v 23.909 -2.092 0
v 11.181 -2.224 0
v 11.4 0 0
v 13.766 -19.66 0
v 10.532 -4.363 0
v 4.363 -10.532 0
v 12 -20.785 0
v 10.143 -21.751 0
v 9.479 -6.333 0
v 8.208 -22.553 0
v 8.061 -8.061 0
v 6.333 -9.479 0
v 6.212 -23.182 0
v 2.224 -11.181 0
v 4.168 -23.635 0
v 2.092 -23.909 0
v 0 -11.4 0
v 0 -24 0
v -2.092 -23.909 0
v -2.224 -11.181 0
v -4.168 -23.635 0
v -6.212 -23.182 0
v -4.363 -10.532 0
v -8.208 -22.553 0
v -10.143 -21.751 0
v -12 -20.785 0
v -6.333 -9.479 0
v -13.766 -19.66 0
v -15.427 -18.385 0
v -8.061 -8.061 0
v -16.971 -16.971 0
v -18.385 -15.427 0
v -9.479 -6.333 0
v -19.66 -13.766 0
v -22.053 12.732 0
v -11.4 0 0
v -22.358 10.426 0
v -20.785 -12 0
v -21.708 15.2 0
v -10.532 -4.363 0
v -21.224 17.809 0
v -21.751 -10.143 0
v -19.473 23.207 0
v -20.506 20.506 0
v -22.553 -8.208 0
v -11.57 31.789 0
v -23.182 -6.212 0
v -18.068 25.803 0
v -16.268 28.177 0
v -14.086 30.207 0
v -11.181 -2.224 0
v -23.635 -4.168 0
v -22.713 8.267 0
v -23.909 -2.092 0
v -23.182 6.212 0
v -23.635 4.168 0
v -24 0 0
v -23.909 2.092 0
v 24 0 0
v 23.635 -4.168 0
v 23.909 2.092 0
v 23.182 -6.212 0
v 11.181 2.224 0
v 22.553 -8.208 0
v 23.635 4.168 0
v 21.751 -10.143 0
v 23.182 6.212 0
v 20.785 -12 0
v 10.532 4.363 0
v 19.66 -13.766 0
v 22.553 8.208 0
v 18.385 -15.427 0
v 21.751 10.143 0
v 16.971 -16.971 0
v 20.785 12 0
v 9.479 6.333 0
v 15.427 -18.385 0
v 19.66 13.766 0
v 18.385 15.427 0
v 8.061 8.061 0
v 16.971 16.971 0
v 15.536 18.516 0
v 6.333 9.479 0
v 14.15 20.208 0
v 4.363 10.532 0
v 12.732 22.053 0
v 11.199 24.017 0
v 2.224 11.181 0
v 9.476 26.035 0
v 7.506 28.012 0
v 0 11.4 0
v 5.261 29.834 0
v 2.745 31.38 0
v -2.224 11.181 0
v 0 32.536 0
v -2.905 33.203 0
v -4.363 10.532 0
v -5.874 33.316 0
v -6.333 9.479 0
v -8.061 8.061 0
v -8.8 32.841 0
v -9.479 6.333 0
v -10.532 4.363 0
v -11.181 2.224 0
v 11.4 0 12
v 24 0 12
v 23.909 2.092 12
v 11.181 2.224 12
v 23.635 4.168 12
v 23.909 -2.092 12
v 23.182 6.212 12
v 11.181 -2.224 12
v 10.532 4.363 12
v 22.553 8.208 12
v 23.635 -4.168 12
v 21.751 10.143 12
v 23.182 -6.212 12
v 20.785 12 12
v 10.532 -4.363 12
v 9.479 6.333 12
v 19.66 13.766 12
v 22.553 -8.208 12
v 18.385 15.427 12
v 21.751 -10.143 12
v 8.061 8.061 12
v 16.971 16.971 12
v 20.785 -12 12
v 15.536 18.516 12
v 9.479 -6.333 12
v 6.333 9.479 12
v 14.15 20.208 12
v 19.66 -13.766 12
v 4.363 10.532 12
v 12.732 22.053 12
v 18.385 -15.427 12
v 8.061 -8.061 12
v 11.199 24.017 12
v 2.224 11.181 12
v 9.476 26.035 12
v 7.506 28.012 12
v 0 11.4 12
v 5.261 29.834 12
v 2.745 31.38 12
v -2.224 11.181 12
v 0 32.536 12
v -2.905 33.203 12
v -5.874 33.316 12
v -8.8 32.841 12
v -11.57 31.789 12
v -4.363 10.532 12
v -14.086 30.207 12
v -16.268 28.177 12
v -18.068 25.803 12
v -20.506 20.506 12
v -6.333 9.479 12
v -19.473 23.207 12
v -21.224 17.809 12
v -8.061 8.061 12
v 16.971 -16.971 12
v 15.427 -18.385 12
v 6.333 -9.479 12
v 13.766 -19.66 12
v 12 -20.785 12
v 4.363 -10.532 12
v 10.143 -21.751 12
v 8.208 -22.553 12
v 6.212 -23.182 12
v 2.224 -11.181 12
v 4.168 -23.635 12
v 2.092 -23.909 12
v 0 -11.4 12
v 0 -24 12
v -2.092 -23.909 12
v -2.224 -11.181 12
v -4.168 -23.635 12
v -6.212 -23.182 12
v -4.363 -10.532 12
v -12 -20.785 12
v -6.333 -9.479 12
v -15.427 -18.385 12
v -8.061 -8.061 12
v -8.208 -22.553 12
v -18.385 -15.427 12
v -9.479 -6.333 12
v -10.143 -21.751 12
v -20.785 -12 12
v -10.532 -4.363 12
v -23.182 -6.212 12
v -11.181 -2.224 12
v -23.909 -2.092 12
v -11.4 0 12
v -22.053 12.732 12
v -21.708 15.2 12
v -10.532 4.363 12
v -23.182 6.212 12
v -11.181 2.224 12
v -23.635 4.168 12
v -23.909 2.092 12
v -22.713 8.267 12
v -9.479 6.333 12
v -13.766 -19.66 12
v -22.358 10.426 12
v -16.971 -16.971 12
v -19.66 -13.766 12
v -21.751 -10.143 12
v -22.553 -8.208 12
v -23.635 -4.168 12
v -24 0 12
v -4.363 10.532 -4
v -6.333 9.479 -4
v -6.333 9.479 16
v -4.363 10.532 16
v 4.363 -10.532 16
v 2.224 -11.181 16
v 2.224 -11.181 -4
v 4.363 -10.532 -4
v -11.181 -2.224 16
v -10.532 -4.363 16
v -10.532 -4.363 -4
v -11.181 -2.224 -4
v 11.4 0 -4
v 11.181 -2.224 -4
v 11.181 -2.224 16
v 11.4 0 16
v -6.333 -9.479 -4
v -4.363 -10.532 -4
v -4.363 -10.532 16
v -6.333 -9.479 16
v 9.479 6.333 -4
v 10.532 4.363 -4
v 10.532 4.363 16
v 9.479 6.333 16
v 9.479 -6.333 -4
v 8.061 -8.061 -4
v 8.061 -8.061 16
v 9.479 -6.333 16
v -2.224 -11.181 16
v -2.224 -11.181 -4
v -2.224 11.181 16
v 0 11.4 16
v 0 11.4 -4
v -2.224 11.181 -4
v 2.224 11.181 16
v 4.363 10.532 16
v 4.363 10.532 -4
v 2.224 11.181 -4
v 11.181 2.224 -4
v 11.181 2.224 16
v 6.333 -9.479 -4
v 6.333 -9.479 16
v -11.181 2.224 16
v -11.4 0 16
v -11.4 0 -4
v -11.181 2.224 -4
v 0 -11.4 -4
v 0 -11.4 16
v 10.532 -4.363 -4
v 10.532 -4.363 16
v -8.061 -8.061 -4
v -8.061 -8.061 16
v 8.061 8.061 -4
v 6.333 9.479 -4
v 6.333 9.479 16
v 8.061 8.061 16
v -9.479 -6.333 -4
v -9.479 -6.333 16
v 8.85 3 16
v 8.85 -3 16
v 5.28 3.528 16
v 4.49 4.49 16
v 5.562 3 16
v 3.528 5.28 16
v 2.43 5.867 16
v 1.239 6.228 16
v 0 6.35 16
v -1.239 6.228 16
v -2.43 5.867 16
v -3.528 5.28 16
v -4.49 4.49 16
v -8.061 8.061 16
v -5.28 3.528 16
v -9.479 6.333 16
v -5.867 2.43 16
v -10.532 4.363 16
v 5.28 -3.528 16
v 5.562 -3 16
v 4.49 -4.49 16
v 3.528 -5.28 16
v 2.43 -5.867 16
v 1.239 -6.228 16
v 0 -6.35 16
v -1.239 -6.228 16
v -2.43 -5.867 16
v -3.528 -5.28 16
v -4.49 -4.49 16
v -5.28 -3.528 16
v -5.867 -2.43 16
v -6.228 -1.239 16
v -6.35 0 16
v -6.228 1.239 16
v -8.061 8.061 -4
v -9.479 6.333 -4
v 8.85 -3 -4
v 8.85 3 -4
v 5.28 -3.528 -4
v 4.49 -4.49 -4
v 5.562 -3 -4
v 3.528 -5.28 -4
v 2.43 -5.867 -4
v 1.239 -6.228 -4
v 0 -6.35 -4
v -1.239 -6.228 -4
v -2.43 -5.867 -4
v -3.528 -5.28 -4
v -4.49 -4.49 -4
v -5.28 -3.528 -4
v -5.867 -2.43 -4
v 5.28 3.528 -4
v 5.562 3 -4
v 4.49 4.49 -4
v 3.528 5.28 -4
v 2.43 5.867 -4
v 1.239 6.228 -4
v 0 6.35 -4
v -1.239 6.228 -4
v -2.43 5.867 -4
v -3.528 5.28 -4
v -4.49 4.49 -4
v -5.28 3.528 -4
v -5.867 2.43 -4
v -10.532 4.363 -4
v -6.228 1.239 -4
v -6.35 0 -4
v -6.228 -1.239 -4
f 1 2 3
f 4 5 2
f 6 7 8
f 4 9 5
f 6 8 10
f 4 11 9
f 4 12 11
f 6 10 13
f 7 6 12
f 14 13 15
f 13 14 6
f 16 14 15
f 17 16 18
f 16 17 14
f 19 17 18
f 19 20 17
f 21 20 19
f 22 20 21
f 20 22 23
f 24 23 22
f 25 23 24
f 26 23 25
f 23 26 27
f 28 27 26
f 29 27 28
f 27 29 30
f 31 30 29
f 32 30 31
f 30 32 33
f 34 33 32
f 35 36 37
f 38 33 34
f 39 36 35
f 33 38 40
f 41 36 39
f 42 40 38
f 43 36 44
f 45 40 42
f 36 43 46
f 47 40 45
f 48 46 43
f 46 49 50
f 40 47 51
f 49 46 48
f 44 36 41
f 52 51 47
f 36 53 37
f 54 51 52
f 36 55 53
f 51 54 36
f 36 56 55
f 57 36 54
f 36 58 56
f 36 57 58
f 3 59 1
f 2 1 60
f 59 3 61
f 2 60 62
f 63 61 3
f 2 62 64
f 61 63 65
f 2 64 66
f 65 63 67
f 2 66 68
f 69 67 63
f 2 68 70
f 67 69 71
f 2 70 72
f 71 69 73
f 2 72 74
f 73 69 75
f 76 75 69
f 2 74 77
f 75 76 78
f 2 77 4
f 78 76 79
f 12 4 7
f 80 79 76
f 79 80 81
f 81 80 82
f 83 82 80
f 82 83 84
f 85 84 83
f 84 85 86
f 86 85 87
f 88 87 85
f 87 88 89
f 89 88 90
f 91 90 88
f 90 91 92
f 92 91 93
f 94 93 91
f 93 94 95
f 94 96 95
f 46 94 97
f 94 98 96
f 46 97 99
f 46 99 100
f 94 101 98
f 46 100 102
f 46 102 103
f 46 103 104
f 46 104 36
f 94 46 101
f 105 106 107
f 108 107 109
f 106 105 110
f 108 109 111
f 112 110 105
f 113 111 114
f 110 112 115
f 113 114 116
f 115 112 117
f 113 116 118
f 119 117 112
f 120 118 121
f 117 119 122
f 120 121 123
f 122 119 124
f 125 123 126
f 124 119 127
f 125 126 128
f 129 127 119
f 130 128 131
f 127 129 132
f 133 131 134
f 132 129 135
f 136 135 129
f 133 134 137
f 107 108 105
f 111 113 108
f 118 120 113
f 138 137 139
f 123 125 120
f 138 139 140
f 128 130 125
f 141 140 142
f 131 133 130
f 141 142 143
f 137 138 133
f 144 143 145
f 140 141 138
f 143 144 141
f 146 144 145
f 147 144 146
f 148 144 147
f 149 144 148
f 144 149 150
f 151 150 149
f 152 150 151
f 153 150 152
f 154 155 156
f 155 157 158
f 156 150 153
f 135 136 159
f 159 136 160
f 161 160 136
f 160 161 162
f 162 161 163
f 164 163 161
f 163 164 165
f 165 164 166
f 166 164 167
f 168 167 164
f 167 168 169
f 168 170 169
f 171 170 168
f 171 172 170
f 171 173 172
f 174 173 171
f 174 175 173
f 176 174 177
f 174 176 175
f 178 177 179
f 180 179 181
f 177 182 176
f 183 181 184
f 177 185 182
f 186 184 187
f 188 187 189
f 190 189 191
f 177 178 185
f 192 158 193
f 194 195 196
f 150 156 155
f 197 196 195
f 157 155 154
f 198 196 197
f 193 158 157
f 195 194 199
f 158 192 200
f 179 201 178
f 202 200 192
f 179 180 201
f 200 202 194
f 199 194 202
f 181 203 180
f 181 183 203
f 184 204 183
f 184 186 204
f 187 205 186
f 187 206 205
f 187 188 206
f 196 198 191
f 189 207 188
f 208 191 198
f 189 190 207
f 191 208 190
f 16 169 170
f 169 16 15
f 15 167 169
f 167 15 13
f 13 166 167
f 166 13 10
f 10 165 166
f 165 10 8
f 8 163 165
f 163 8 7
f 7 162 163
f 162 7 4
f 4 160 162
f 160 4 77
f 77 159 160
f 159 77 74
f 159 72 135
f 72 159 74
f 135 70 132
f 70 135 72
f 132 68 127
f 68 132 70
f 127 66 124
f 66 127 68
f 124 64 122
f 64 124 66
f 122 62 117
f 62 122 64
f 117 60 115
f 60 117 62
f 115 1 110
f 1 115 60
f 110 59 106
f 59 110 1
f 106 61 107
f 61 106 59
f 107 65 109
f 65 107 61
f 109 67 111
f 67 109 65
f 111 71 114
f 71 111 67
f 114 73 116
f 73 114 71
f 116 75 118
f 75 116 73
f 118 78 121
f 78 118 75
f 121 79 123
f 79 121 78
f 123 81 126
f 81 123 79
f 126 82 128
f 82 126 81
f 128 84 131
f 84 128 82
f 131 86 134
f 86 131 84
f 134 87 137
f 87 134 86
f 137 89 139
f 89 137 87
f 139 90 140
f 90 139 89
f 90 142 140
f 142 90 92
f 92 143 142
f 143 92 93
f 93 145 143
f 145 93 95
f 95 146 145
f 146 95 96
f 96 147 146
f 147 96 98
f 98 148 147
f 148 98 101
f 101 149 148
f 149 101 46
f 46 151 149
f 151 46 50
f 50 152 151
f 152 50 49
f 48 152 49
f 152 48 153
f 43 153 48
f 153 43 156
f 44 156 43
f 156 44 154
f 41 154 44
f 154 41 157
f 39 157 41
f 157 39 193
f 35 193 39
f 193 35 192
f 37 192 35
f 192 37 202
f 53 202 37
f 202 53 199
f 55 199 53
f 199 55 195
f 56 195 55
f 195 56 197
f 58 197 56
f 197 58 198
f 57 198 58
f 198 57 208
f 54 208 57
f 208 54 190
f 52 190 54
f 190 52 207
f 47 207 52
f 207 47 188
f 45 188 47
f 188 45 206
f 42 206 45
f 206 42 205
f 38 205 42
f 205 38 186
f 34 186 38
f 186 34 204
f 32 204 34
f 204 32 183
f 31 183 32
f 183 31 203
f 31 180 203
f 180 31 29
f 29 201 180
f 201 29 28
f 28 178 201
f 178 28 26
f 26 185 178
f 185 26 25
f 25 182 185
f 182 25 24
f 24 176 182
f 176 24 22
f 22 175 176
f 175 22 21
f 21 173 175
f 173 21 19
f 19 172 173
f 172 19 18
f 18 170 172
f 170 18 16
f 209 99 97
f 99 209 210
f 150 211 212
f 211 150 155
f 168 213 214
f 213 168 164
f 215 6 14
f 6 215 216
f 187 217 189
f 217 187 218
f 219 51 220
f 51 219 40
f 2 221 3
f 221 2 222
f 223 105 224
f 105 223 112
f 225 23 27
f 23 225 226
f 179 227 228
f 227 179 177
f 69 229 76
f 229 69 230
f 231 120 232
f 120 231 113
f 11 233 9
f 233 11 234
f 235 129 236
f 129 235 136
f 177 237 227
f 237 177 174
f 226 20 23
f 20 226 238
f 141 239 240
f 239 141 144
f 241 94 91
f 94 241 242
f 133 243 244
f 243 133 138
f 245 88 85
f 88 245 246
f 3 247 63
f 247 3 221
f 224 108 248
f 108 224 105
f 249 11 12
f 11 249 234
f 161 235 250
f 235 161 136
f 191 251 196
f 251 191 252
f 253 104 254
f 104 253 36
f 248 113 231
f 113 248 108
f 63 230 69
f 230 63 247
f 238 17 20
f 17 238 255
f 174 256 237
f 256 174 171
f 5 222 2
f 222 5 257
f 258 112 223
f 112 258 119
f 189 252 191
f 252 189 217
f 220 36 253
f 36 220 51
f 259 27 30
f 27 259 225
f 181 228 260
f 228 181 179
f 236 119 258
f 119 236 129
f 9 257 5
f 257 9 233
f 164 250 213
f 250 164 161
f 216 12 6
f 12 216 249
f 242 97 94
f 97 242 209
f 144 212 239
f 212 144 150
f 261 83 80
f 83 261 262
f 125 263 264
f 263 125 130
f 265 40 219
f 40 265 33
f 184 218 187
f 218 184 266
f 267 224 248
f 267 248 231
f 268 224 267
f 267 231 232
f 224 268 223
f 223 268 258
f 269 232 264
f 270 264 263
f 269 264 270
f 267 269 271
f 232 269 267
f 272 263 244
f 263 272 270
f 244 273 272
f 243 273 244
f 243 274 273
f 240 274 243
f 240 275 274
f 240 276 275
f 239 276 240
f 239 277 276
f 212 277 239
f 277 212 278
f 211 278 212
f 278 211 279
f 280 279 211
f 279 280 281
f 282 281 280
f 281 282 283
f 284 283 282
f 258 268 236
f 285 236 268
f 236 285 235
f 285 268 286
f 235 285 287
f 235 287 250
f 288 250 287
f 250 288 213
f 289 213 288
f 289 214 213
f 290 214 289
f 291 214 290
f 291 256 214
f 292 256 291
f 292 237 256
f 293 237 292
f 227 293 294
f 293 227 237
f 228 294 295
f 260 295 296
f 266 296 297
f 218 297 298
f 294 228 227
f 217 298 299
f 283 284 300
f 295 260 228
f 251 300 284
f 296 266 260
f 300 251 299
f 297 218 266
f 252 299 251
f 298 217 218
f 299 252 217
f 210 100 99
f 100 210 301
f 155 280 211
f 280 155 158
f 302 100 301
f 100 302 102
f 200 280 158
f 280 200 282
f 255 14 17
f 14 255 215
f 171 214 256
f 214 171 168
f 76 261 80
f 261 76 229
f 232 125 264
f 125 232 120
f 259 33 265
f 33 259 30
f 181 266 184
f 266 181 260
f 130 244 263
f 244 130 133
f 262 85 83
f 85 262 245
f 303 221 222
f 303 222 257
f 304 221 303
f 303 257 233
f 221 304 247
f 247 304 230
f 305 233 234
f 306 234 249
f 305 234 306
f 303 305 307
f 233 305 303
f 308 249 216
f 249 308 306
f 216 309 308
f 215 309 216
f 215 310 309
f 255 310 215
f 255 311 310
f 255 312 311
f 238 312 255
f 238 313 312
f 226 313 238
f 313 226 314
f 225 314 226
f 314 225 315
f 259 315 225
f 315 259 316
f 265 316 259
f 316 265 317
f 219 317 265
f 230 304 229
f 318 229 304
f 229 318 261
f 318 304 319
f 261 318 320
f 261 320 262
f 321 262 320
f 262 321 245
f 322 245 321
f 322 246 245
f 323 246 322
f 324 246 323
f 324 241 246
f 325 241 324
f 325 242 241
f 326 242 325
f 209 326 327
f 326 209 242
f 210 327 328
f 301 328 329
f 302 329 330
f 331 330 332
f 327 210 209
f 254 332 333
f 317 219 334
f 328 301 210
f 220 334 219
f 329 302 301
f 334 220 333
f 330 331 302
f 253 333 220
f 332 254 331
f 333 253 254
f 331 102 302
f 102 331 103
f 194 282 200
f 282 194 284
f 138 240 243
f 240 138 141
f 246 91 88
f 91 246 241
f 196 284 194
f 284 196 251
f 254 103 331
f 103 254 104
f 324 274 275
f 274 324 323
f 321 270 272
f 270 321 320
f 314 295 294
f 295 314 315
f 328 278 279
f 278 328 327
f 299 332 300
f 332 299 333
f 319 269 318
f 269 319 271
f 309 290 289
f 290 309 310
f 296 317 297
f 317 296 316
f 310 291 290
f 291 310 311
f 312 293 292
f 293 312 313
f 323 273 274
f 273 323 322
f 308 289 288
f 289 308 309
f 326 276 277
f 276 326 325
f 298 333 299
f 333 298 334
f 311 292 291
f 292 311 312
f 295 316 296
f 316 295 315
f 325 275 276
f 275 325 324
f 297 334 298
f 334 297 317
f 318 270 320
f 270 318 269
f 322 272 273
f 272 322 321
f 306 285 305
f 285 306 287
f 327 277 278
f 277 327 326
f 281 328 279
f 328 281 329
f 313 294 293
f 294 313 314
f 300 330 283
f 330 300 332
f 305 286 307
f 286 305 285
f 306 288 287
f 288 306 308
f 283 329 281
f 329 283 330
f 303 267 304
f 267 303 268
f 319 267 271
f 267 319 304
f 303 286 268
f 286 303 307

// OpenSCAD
$fn = 32;

// ----------------------------------------------------------------------
// Cam: base radius 24 mm with a 10 mm lift over 120 degrees
// ----------------------------------------------------------------------

// --- parameters (mm) ---
base_r = 24;              // base radius
lift = 10;                // lift height above the base radius
lift_span = 120;          // angular width of the lift
lift_start = 45;          // angle where the lift starts
cam_t = 12;               // cam plate thickness
hub_d = 22.8;             // hub diameter
hub_h = 20;               // hub height
bore_d = 12.7;            // bore
key_w = 6;                // keyway width
key_depth = 3;            // keyway depth

cam_profile = [[24, 0], [23.909, 2.092], [23.635, 4.168], [23.182, 6.212], [22.553, 8.208], [21.751, 10.143], [20.785, 12], [19.66, 13.766], [18.385, 15.427], [16.971, 16.971], [15.536, 18.516], [14.15, 20.208], [12.732, 22.053], [11.199, 24.017], [9.476, 26.035], [7.506, 28.012], [5.261, 29.834], [2.745, 31.38], [0, 32.536], [-2.905, 33.203], [-5.874, 33.316], [-8.8, 32.841], [-11.57, 31.789], [-14.086, 30.207], [-16.268, 28.177], [-18.068, 25.803], [-19.473, 23.207], [-20.506, 20.506], [-21.224, 17.809], [-21.708, 15.2], [-22.053, 12.732], [-22.358, 10.426], [-22.713, 8.267], [-23.182, 6.212], [-23.635, 4.168], [-23.909, 2.092], [-24, 0], [-23.909, -2.092], [-23.635, -4.168], [-23.182, -6.212], [-22.553, -8.208], [-21.751, -10.143], [-20.785, -12], [-19.66, -13.766], [-18.385, -15.427], [-16.971, -16.971], [-15.427, -18.385], [-13.766, -19.66], [-12, -20.785], [-10.143, -21.751], [-8.208, -22.553], [-6.212, -23.182], [-4.168, -23.635], [-2.092, -23.909], [0, -24], [2.092, -23.909], [4.168, -23.635], [6.212, -23.182], [8.208, -22.553], [10.143, -21.751], [12, -20.785], [13.766, -19.66], [15.427, -18.385], [16.971, -16.971], [18.385, -15.427], [19.66, -13.766], [20.785, -12], [21.751, -10.143], [22.553, -8.208], [23.182, -6.212], [23.635, -4.168], [23.909, -2.092]];

difference() {
  union() {
    linear_extrude(height = cam_t) polygon(cam_profile);
    /* hub, proud of the cam plate on both sides */
    translate([0, 0, -4]) cylinder(h = hub_h, d = hub_d);
  }
  /* bore through the hub, 2.5 mm clear on both faces */
  translate([0, 0, -6.5]) cylinder(h = hub_h + 5, d = bore_d);
  /* keyway, milled through the whole hub */
  translate([3.35, -3, -6.5]) cube([5.5, 6, 25]);
}
